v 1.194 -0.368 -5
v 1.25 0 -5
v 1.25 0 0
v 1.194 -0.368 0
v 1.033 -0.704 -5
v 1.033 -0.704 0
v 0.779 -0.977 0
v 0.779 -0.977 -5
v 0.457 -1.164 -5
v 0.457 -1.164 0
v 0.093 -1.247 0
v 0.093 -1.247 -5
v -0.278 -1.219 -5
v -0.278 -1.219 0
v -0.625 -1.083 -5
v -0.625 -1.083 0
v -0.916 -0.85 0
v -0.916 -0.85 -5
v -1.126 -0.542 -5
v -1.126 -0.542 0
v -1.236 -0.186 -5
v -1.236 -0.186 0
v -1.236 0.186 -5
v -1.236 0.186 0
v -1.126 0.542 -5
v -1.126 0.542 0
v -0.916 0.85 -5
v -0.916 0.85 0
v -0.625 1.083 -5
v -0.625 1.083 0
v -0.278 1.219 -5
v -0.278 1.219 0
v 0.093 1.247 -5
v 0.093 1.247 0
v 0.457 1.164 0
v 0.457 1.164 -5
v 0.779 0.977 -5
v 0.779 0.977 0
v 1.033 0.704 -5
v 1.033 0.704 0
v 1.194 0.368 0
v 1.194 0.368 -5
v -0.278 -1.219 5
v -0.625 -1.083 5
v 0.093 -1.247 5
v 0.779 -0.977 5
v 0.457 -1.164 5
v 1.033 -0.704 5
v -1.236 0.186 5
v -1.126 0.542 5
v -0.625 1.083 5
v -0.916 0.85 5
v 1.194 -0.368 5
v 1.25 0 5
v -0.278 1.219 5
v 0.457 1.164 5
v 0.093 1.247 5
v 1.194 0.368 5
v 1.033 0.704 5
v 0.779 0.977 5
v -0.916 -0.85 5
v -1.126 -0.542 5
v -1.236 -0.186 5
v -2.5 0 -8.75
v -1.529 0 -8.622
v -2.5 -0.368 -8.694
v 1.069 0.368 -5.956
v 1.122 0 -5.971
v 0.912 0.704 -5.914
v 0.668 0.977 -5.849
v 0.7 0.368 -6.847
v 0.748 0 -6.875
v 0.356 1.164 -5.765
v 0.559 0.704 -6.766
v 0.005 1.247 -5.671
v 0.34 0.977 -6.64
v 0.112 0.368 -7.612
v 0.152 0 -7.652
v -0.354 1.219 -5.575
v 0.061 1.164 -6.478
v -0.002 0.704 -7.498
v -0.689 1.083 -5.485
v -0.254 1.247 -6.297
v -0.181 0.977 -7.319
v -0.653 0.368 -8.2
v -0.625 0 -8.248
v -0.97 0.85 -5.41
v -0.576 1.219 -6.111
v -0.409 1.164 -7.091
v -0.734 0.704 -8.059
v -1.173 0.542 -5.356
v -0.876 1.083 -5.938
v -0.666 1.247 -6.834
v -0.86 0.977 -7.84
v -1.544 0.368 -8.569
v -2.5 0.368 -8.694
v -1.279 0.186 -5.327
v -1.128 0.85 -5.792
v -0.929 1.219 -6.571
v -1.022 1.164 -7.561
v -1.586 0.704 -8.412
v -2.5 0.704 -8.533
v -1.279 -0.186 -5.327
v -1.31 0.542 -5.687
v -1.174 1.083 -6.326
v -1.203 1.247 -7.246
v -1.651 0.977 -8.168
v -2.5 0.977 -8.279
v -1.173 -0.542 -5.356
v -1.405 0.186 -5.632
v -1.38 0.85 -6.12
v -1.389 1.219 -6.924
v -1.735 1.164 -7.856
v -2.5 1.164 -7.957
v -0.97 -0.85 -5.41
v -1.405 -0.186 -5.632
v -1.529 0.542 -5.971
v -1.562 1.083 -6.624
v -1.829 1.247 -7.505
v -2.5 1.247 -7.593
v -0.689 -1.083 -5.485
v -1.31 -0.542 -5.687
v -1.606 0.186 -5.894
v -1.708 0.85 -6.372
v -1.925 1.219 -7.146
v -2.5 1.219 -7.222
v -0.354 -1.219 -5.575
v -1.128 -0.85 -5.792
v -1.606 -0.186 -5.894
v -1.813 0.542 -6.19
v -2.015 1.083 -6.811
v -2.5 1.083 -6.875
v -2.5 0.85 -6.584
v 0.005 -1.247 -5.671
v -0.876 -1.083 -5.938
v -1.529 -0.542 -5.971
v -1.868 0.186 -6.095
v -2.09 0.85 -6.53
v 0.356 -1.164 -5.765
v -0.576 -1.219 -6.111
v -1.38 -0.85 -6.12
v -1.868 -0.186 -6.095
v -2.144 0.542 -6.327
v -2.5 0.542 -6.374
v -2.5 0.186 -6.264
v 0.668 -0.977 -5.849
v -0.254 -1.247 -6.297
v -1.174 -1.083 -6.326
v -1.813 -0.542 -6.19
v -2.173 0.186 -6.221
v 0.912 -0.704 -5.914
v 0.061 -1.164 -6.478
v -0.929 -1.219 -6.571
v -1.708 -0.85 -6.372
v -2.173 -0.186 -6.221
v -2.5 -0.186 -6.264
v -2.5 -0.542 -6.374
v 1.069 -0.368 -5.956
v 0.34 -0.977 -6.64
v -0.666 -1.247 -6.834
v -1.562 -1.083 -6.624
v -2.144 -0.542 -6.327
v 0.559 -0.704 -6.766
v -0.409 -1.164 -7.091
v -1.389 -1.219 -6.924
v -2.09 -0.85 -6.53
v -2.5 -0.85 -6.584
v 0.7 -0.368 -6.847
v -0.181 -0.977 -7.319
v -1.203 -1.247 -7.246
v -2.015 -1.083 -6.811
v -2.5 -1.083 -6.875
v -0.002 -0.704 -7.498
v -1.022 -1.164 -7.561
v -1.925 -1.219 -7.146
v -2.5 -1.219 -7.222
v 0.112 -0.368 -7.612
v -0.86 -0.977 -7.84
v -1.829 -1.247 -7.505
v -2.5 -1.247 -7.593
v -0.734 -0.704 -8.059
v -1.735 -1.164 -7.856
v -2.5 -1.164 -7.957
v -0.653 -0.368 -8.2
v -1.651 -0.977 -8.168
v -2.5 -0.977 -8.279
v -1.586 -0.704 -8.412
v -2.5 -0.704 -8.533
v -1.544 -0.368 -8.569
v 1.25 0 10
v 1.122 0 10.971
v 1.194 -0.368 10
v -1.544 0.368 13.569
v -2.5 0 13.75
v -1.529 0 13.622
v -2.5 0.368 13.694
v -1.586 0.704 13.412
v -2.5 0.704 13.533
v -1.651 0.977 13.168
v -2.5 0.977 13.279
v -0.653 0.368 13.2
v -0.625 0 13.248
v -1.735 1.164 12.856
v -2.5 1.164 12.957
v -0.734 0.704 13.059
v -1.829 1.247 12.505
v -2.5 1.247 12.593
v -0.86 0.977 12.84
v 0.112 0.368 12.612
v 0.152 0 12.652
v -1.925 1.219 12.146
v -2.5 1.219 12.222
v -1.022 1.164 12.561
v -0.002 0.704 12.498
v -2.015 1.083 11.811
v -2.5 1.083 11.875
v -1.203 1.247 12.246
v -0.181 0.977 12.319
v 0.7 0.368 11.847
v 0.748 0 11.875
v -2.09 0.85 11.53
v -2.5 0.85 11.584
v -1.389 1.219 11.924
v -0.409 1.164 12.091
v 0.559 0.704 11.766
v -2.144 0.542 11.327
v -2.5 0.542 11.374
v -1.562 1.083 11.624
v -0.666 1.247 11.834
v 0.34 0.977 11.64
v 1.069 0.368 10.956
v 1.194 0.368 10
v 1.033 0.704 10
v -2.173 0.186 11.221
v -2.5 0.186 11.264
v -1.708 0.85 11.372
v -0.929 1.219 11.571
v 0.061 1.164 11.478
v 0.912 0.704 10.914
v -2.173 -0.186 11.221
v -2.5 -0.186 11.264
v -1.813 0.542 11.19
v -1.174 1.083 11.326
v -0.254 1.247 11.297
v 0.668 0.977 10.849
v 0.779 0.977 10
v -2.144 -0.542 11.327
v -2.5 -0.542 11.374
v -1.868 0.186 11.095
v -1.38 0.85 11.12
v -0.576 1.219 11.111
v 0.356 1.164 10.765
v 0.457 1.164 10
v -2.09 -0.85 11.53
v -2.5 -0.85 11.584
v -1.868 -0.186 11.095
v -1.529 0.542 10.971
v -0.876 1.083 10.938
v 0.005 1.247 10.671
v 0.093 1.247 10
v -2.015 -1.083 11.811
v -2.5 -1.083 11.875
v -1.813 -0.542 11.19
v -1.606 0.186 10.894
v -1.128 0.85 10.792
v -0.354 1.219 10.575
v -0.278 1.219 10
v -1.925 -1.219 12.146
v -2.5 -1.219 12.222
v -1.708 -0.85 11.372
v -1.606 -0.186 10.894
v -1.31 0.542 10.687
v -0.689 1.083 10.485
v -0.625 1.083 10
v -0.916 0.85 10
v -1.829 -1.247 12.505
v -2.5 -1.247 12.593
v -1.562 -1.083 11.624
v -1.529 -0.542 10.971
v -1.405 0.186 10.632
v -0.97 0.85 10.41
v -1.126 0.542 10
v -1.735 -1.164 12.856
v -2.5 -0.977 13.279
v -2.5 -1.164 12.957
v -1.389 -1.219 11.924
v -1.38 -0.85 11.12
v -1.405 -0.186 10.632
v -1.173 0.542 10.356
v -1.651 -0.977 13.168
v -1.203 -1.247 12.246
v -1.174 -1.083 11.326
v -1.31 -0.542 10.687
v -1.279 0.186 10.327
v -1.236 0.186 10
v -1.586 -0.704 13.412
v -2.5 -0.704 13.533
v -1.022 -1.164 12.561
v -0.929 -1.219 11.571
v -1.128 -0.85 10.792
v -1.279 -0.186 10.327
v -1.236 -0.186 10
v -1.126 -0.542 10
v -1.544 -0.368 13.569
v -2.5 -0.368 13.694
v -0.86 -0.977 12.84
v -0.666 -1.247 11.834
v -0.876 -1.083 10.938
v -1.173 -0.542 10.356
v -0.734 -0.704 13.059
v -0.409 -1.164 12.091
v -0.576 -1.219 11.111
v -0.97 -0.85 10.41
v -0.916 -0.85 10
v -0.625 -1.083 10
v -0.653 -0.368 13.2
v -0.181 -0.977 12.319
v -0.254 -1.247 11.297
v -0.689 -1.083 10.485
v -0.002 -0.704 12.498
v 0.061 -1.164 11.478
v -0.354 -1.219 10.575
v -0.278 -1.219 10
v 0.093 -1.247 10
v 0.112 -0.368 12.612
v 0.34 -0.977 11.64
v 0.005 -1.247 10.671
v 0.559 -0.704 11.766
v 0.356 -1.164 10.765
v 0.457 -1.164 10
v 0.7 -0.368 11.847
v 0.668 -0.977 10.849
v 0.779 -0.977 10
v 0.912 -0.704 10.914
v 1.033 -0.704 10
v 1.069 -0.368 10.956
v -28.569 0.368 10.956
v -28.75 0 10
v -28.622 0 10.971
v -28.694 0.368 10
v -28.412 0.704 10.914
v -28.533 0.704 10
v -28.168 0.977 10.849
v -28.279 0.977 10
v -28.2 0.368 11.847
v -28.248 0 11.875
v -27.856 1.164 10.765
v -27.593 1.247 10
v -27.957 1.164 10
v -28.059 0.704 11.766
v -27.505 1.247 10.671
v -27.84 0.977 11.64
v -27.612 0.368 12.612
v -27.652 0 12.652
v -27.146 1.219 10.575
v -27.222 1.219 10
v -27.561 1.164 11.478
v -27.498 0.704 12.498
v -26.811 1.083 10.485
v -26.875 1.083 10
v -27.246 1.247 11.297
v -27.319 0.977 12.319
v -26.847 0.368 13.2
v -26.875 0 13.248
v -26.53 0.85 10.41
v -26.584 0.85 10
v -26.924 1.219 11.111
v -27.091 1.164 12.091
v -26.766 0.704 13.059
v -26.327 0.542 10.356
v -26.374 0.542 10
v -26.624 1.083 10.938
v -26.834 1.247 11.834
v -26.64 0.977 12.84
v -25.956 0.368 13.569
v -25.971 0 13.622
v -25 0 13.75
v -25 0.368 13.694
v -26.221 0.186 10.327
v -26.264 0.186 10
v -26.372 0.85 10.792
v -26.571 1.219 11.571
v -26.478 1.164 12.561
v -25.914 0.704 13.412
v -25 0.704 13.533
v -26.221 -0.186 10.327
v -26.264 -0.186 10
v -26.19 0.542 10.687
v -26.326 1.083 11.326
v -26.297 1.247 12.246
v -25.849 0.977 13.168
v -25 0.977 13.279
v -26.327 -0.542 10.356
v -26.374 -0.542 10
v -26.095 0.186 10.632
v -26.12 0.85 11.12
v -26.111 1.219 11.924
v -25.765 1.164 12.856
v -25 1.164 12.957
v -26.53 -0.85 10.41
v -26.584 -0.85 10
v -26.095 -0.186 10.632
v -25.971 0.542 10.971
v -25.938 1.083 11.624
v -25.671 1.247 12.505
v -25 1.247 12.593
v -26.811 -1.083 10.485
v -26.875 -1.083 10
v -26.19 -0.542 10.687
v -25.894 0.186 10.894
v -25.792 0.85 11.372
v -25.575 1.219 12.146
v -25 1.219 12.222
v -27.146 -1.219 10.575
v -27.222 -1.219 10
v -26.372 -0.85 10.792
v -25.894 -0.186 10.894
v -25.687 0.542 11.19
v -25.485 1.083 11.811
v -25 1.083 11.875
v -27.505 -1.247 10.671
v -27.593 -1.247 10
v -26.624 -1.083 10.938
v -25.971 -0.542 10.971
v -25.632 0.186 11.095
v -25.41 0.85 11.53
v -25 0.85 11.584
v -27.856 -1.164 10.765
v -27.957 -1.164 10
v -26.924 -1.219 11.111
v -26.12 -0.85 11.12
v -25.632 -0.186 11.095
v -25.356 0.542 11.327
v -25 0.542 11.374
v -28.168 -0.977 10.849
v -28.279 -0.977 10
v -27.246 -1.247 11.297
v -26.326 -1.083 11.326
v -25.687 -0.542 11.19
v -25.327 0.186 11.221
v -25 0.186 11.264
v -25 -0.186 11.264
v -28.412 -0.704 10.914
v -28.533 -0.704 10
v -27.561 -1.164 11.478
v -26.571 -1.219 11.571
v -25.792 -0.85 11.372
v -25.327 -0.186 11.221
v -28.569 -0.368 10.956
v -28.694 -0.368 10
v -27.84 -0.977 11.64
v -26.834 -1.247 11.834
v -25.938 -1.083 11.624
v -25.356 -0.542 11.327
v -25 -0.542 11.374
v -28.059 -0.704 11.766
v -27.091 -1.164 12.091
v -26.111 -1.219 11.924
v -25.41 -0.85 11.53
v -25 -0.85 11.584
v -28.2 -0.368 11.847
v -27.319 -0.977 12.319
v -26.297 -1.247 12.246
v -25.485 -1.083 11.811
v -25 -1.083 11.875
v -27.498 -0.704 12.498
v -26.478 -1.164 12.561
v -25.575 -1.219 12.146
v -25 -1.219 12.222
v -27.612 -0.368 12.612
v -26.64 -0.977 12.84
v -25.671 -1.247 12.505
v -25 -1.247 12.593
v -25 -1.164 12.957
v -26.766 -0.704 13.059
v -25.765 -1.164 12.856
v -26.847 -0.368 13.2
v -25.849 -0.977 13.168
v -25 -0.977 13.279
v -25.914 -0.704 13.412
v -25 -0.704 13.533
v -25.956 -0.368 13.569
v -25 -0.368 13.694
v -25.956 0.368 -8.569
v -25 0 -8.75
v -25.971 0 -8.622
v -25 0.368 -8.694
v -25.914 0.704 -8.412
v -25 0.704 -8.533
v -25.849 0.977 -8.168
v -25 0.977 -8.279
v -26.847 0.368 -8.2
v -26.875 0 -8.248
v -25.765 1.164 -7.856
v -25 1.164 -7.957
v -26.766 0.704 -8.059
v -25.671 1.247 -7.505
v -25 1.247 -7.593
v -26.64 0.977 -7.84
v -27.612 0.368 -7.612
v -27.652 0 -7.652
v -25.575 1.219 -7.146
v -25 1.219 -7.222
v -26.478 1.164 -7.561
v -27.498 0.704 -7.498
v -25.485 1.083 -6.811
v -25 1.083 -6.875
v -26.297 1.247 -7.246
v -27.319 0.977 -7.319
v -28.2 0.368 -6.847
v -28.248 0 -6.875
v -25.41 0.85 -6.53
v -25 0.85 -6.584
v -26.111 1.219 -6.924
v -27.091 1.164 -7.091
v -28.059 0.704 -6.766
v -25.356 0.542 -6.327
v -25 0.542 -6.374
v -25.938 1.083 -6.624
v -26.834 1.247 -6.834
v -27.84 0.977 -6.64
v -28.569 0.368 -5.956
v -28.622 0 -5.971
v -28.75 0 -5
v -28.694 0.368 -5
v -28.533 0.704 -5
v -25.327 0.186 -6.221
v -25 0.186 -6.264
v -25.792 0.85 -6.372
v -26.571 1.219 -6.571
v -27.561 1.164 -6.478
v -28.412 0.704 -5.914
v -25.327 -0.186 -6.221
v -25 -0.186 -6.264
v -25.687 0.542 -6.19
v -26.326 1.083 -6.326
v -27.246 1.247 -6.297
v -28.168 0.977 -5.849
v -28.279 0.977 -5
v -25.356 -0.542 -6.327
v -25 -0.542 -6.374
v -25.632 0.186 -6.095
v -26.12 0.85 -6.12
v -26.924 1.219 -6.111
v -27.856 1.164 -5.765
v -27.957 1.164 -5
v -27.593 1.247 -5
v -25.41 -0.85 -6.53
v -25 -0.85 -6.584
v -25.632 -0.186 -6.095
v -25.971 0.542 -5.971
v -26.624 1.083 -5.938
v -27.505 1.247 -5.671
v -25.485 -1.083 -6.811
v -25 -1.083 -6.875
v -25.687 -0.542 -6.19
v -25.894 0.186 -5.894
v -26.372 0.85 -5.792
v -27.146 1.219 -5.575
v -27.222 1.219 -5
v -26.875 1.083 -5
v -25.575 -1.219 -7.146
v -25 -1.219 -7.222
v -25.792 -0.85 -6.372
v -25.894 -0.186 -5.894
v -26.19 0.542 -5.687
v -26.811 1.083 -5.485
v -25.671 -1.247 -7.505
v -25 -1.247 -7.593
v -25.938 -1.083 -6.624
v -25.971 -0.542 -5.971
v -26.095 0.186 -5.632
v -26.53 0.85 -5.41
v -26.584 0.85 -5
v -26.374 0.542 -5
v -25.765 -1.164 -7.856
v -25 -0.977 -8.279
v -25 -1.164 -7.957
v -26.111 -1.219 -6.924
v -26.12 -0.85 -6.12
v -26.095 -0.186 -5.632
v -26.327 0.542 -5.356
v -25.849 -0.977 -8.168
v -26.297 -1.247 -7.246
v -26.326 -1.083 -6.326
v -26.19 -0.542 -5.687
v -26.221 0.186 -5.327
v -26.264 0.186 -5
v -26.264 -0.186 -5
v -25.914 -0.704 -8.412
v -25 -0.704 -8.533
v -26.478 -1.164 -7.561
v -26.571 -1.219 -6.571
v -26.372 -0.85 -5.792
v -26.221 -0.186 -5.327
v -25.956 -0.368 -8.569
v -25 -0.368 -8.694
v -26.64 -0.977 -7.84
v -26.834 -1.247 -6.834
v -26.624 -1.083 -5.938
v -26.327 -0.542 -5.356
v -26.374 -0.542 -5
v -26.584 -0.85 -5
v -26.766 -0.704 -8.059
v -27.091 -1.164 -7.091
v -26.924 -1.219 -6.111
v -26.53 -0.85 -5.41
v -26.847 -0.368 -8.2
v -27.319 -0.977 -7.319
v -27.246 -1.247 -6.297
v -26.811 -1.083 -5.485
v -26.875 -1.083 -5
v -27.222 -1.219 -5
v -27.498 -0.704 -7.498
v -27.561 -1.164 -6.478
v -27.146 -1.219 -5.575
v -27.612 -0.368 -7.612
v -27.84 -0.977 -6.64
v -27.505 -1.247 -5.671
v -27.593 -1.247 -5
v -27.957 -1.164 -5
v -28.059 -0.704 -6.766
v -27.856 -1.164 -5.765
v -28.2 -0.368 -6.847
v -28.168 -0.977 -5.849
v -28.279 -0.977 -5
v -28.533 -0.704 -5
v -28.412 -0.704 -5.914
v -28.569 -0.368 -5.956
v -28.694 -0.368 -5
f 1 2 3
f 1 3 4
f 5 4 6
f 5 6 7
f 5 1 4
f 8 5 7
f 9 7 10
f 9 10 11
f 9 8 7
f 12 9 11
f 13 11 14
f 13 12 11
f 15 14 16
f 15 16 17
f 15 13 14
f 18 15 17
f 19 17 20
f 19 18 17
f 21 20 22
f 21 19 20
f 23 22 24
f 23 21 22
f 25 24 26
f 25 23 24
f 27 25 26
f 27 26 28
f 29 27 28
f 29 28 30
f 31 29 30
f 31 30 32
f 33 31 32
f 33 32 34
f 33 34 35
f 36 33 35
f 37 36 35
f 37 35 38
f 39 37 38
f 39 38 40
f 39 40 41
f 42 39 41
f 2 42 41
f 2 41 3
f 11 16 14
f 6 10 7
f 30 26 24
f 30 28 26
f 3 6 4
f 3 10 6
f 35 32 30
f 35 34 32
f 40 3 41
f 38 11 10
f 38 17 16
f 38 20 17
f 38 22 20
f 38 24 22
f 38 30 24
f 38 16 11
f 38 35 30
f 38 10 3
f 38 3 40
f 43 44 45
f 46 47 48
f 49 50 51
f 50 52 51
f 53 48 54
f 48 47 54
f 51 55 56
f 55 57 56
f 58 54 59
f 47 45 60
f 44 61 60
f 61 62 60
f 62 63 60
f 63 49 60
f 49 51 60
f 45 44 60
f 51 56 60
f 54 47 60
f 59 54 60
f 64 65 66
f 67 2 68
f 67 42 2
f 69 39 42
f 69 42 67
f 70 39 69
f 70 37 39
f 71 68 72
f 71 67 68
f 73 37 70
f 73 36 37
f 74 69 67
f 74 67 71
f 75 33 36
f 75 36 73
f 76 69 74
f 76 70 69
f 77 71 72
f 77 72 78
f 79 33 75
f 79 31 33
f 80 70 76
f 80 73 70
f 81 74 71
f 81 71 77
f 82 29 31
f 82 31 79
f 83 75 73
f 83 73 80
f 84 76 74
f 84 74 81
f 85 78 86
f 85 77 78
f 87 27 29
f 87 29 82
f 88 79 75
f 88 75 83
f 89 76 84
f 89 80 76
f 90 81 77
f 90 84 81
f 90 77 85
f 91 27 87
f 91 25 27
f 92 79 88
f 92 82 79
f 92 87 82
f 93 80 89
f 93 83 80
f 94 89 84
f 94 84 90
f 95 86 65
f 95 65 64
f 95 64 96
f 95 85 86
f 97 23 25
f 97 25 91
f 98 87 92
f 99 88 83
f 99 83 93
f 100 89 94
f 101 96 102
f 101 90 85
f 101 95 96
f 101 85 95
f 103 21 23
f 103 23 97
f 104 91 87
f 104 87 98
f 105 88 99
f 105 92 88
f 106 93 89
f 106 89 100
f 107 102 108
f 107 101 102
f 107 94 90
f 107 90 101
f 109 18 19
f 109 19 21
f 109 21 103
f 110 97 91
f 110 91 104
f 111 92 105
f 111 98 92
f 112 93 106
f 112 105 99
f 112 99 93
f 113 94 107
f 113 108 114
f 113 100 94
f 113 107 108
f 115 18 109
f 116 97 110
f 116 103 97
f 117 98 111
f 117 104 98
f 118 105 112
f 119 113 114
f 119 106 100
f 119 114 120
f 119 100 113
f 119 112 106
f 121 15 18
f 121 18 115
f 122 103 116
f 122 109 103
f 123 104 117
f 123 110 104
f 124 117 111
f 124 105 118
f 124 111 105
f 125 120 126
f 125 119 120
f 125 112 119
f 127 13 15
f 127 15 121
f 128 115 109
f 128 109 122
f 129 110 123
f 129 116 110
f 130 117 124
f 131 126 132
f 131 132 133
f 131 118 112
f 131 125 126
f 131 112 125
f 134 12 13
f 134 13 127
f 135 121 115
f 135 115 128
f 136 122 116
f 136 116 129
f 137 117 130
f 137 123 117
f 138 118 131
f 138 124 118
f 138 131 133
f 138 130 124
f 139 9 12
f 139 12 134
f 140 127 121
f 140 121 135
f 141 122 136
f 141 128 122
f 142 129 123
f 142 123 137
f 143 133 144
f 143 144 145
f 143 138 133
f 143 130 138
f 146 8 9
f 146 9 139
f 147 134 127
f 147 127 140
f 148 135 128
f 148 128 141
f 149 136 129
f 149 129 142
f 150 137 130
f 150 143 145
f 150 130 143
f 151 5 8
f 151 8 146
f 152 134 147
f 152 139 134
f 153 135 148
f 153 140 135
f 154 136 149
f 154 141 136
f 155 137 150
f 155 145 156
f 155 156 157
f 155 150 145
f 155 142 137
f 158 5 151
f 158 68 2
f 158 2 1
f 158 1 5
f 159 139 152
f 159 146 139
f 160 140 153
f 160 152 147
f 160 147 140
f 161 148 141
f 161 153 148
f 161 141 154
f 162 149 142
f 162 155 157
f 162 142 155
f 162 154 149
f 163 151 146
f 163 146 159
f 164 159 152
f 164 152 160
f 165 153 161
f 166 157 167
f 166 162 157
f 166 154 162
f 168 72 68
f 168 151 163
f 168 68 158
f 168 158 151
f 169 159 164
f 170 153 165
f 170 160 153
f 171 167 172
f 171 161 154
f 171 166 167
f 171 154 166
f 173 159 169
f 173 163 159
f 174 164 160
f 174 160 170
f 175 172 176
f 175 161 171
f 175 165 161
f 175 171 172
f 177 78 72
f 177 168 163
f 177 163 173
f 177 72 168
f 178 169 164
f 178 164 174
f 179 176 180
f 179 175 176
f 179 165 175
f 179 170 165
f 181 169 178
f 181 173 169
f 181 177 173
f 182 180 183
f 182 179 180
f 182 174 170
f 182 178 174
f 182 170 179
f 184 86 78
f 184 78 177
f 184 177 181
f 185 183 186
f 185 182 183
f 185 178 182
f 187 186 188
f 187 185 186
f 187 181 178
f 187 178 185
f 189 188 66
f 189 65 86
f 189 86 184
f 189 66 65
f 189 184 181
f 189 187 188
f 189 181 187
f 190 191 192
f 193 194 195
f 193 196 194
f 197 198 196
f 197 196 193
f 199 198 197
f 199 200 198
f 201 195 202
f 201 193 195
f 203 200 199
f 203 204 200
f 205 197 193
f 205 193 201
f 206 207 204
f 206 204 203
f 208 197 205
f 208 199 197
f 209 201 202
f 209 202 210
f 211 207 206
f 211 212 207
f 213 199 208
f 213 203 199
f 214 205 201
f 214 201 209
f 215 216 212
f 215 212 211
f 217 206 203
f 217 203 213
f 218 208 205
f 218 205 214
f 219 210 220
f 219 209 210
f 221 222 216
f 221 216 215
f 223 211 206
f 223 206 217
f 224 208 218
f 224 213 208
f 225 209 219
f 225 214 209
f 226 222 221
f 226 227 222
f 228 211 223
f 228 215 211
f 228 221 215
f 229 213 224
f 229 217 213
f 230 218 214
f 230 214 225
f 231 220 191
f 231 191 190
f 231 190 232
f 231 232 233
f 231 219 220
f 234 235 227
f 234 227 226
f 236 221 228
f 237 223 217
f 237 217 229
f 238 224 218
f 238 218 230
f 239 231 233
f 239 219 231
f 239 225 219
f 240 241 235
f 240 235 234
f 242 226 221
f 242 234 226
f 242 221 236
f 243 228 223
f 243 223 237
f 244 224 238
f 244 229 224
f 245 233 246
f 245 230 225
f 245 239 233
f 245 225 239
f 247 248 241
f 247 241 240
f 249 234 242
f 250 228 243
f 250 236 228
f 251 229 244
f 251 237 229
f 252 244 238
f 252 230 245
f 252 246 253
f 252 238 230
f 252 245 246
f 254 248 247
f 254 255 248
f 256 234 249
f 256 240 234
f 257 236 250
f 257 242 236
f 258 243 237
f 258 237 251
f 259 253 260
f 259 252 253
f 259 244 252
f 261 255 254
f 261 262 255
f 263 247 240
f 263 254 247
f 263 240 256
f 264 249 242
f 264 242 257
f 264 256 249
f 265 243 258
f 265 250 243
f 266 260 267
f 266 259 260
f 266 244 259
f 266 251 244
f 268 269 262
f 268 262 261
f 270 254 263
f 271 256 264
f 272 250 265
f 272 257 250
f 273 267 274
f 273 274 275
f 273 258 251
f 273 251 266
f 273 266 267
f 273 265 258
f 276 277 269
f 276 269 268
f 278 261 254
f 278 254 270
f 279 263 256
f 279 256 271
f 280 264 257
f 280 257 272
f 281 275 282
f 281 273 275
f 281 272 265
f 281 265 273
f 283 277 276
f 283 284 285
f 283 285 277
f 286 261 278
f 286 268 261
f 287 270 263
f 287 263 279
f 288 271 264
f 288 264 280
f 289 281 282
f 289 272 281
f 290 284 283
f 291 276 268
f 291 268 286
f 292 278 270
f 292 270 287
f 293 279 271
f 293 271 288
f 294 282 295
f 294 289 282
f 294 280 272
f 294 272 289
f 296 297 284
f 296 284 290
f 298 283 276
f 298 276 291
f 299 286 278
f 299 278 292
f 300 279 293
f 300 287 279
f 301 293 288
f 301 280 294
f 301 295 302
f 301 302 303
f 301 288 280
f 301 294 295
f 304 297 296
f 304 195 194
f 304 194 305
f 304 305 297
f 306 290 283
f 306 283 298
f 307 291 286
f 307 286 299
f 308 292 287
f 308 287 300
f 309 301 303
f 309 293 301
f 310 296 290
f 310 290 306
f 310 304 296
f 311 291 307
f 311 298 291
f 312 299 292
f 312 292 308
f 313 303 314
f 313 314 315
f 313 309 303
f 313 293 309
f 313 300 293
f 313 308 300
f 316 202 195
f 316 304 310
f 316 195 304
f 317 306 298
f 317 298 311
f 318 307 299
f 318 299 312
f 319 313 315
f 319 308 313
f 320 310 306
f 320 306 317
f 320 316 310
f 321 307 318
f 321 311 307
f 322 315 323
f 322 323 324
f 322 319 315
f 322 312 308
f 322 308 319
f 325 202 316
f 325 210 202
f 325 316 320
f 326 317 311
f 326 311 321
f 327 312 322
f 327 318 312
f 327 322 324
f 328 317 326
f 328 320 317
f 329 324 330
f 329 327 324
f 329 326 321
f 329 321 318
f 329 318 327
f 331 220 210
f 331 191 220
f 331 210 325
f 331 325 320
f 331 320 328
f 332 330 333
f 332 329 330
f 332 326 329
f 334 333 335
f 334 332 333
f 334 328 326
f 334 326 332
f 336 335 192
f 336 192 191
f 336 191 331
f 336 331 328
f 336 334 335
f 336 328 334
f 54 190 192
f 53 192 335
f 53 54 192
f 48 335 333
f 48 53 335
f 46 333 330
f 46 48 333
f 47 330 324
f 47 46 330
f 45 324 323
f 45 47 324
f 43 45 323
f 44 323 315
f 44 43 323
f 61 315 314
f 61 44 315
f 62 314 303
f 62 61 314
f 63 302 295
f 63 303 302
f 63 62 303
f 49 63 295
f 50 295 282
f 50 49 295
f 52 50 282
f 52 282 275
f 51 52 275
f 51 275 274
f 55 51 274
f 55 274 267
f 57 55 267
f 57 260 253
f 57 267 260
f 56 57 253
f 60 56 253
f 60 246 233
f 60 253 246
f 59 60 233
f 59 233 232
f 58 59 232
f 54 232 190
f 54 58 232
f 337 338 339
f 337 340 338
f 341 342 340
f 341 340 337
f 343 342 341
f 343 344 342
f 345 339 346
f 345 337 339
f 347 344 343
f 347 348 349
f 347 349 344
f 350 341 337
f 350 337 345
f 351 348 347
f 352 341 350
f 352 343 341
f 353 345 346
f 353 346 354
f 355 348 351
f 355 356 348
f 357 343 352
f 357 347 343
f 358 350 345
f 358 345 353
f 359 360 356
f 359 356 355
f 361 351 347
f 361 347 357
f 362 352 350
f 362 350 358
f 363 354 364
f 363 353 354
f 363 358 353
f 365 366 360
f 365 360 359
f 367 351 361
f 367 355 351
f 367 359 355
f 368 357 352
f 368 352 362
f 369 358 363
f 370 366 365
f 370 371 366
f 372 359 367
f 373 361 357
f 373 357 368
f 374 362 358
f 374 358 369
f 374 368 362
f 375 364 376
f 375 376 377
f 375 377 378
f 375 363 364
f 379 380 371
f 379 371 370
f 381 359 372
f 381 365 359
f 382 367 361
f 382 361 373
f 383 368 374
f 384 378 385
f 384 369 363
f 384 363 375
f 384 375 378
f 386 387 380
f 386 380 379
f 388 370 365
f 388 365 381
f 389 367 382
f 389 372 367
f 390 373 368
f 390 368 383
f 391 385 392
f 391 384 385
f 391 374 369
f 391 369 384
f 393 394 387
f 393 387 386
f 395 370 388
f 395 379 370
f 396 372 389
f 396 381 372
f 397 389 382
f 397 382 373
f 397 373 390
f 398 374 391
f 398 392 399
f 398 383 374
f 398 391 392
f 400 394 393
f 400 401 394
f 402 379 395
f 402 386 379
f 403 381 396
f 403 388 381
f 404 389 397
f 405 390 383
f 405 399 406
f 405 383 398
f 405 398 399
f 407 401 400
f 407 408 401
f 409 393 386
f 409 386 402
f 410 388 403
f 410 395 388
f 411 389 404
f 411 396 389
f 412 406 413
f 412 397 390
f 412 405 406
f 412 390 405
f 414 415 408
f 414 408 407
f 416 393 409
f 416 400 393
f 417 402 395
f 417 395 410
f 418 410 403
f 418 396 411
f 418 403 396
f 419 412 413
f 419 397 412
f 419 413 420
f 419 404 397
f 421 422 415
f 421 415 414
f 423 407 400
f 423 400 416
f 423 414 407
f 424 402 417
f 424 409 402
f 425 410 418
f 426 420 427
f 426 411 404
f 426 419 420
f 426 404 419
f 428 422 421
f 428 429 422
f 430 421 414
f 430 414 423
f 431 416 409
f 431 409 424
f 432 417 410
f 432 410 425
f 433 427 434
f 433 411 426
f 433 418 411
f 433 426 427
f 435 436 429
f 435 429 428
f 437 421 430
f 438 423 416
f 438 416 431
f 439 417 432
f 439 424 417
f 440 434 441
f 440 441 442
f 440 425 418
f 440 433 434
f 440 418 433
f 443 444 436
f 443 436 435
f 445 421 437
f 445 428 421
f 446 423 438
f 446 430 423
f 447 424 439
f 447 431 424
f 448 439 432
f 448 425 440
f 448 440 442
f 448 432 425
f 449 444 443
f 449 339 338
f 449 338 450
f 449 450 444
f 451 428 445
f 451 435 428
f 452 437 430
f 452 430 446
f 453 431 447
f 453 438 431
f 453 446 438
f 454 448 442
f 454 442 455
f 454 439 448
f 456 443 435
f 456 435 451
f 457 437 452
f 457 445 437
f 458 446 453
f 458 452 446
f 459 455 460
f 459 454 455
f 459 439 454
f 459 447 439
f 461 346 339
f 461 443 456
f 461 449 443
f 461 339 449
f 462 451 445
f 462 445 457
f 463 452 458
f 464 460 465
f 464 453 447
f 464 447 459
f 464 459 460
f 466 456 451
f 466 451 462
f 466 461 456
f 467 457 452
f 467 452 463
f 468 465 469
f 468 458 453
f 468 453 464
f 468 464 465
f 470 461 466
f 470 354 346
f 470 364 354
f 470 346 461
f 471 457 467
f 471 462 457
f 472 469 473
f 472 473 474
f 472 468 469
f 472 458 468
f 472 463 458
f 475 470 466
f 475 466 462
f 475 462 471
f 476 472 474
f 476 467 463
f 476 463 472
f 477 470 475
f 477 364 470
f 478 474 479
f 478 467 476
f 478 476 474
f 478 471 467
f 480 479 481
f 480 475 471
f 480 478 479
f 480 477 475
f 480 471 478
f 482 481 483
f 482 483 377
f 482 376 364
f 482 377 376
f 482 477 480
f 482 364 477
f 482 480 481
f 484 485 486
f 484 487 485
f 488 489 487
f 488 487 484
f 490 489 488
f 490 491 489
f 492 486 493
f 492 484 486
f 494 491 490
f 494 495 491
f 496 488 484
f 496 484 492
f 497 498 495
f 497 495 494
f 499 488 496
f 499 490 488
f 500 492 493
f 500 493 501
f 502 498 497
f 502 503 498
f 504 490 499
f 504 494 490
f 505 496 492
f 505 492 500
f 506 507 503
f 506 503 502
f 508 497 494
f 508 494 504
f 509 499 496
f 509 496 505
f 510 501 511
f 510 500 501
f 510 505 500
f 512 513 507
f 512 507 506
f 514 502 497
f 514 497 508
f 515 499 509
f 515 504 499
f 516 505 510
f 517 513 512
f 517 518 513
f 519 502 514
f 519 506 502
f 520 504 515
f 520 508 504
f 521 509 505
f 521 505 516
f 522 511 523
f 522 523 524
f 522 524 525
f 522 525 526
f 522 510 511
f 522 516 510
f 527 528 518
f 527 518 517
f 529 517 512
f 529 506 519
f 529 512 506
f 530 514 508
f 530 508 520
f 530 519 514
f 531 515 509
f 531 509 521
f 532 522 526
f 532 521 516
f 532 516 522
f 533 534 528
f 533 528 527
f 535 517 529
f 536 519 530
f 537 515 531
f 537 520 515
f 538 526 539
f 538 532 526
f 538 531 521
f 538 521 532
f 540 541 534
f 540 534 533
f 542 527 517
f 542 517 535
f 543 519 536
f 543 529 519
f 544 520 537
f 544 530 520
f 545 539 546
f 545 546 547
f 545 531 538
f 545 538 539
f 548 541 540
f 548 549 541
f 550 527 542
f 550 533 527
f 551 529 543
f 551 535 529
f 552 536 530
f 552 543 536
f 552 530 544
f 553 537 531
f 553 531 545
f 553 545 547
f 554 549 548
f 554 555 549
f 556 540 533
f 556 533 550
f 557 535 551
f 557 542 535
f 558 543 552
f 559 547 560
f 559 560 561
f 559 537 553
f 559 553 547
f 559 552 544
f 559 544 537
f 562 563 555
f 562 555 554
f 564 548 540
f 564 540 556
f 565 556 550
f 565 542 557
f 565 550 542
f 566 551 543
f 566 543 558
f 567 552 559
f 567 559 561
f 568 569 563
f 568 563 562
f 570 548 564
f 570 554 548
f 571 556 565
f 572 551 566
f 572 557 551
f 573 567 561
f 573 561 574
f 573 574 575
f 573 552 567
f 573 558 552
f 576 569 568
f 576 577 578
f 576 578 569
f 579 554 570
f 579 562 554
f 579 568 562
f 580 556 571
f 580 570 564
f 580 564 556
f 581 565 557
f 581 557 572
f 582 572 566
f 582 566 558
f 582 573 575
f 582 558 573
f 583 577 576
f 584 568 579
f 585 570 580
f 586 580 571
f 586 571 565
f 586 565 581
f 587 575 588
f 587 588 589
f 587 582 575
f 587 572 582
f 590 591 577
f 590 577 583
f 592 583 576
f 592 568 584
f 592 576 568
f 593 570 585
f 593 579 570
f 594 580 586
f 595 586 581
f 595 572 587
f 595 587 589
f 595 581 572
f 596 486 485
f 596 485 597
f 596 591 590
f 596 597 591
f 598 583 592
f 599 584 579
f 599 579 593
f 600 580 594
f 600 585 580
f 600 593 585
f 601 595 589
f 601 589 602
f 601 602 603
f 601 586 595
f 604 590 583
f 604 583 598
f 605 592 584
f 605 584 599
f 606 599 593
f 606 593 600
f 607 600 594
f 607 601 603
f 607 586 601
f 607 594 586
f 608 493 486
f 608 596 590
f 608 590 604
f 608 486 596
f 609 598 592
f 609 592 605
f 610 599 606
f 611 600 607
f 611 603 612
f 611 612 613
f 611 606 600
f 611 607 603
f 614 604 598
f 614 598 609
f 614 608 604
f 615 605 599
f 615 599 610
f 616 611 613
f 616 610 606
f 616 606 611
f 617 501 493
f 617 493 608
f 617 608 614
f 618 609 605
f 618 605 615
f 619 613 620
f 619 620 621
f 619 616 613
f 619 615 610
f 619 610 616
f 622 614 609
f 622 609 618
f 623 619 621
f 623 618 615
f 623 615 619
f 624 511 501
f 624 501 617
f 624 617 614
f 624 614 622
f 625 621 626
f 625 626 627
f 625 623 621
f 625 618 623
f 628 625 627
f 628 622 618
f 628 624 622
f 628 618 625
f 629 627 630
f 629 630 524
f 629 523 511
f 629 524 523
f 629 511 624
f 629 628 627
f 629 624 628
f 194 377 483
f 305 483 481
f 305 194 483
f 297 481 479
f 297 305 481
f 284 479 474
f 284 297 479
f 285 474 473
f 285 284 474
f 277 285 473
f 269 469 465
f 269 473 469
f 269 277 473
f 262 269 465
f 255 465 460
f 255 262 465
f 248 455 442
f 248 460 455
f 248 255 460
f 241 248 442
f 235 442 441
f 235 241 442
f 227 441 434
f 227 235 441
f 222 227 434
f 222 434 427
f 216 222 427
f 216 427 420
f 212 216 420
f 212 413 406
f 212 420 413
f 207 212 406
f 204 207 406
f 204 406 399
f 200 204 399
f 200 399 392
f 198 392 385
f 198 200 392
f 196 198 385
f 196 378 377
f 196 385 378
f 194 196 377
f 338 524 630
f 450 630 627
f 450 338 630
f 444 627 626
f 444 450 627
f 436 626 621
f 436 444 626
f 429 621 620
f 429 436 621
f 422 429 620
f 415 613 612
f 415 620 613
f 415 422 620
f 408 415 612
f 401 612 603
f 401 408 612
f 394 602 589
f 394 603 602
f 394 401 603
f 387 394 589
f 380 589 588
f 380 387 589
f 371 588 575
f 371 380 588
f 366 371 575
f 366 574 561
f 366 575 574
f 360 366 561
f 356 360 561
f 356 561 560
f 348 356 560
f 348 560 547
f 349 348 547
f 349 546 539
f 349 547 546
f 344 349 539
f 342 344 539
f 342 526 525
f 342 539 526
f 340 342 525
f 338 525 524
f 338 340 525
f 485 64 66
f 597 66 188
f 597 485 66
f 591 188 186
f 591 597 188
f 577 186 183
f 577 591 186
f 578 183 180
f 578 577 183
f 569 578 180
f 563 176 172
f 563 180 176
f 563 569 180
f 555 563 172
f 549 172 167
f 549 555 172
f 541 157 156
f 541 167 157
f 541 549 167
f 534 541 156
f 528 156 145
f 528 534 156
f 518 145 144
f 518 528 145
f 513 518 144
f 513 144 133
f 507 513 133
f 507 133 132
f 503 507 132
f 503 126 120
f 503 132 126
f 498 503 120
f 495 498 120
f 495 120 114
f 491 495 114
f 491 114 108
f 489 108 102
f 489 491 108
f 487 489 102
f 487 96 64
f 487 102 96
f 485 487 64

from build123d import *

# Parameters (mm, degrees)
ESQUISSE1_R = 1.25


with BuildPart() as part:
    # Balayage1: sweep along a path in Esquisse2
    with BuildLine(Plane(origin=(0, 0, 0), x_dir=(1, 0, 0), z_dir=(0, 1, 0))) as balayage1_path:
        Line((0, 0), (0, 5))
        ThreePointArc((0, 5), (-0.732233047, 6.767766953), (-2.5, 7.5))
        Line((-2.5, 7.5), (-25, 7.5))
        ThreePointArc((-25, 7.5), (-26.767766953, 6.767766953), (-27.5, 5))
        Line((-27.5, 5), (-27.5, -10))
        ThreePointArc((-27.5, -10), (-26.767766953, -11.767766953), (-25, -12.5))
        Line((-25, -12.5), (-2.5, -12.5))
        ThreePointArc((-2.5, -12.5), (-0.732233047, -11.767766953), (0, -10))
        Line((0, -10), (0, -5))
    # Esquisse1 → Balayage1 (sweep)
    with BuildSketch(Plane.XY):
        Circle(ESQUISSE1_R)
    sweep(path=balayage1_path.line)


solid = part.part
